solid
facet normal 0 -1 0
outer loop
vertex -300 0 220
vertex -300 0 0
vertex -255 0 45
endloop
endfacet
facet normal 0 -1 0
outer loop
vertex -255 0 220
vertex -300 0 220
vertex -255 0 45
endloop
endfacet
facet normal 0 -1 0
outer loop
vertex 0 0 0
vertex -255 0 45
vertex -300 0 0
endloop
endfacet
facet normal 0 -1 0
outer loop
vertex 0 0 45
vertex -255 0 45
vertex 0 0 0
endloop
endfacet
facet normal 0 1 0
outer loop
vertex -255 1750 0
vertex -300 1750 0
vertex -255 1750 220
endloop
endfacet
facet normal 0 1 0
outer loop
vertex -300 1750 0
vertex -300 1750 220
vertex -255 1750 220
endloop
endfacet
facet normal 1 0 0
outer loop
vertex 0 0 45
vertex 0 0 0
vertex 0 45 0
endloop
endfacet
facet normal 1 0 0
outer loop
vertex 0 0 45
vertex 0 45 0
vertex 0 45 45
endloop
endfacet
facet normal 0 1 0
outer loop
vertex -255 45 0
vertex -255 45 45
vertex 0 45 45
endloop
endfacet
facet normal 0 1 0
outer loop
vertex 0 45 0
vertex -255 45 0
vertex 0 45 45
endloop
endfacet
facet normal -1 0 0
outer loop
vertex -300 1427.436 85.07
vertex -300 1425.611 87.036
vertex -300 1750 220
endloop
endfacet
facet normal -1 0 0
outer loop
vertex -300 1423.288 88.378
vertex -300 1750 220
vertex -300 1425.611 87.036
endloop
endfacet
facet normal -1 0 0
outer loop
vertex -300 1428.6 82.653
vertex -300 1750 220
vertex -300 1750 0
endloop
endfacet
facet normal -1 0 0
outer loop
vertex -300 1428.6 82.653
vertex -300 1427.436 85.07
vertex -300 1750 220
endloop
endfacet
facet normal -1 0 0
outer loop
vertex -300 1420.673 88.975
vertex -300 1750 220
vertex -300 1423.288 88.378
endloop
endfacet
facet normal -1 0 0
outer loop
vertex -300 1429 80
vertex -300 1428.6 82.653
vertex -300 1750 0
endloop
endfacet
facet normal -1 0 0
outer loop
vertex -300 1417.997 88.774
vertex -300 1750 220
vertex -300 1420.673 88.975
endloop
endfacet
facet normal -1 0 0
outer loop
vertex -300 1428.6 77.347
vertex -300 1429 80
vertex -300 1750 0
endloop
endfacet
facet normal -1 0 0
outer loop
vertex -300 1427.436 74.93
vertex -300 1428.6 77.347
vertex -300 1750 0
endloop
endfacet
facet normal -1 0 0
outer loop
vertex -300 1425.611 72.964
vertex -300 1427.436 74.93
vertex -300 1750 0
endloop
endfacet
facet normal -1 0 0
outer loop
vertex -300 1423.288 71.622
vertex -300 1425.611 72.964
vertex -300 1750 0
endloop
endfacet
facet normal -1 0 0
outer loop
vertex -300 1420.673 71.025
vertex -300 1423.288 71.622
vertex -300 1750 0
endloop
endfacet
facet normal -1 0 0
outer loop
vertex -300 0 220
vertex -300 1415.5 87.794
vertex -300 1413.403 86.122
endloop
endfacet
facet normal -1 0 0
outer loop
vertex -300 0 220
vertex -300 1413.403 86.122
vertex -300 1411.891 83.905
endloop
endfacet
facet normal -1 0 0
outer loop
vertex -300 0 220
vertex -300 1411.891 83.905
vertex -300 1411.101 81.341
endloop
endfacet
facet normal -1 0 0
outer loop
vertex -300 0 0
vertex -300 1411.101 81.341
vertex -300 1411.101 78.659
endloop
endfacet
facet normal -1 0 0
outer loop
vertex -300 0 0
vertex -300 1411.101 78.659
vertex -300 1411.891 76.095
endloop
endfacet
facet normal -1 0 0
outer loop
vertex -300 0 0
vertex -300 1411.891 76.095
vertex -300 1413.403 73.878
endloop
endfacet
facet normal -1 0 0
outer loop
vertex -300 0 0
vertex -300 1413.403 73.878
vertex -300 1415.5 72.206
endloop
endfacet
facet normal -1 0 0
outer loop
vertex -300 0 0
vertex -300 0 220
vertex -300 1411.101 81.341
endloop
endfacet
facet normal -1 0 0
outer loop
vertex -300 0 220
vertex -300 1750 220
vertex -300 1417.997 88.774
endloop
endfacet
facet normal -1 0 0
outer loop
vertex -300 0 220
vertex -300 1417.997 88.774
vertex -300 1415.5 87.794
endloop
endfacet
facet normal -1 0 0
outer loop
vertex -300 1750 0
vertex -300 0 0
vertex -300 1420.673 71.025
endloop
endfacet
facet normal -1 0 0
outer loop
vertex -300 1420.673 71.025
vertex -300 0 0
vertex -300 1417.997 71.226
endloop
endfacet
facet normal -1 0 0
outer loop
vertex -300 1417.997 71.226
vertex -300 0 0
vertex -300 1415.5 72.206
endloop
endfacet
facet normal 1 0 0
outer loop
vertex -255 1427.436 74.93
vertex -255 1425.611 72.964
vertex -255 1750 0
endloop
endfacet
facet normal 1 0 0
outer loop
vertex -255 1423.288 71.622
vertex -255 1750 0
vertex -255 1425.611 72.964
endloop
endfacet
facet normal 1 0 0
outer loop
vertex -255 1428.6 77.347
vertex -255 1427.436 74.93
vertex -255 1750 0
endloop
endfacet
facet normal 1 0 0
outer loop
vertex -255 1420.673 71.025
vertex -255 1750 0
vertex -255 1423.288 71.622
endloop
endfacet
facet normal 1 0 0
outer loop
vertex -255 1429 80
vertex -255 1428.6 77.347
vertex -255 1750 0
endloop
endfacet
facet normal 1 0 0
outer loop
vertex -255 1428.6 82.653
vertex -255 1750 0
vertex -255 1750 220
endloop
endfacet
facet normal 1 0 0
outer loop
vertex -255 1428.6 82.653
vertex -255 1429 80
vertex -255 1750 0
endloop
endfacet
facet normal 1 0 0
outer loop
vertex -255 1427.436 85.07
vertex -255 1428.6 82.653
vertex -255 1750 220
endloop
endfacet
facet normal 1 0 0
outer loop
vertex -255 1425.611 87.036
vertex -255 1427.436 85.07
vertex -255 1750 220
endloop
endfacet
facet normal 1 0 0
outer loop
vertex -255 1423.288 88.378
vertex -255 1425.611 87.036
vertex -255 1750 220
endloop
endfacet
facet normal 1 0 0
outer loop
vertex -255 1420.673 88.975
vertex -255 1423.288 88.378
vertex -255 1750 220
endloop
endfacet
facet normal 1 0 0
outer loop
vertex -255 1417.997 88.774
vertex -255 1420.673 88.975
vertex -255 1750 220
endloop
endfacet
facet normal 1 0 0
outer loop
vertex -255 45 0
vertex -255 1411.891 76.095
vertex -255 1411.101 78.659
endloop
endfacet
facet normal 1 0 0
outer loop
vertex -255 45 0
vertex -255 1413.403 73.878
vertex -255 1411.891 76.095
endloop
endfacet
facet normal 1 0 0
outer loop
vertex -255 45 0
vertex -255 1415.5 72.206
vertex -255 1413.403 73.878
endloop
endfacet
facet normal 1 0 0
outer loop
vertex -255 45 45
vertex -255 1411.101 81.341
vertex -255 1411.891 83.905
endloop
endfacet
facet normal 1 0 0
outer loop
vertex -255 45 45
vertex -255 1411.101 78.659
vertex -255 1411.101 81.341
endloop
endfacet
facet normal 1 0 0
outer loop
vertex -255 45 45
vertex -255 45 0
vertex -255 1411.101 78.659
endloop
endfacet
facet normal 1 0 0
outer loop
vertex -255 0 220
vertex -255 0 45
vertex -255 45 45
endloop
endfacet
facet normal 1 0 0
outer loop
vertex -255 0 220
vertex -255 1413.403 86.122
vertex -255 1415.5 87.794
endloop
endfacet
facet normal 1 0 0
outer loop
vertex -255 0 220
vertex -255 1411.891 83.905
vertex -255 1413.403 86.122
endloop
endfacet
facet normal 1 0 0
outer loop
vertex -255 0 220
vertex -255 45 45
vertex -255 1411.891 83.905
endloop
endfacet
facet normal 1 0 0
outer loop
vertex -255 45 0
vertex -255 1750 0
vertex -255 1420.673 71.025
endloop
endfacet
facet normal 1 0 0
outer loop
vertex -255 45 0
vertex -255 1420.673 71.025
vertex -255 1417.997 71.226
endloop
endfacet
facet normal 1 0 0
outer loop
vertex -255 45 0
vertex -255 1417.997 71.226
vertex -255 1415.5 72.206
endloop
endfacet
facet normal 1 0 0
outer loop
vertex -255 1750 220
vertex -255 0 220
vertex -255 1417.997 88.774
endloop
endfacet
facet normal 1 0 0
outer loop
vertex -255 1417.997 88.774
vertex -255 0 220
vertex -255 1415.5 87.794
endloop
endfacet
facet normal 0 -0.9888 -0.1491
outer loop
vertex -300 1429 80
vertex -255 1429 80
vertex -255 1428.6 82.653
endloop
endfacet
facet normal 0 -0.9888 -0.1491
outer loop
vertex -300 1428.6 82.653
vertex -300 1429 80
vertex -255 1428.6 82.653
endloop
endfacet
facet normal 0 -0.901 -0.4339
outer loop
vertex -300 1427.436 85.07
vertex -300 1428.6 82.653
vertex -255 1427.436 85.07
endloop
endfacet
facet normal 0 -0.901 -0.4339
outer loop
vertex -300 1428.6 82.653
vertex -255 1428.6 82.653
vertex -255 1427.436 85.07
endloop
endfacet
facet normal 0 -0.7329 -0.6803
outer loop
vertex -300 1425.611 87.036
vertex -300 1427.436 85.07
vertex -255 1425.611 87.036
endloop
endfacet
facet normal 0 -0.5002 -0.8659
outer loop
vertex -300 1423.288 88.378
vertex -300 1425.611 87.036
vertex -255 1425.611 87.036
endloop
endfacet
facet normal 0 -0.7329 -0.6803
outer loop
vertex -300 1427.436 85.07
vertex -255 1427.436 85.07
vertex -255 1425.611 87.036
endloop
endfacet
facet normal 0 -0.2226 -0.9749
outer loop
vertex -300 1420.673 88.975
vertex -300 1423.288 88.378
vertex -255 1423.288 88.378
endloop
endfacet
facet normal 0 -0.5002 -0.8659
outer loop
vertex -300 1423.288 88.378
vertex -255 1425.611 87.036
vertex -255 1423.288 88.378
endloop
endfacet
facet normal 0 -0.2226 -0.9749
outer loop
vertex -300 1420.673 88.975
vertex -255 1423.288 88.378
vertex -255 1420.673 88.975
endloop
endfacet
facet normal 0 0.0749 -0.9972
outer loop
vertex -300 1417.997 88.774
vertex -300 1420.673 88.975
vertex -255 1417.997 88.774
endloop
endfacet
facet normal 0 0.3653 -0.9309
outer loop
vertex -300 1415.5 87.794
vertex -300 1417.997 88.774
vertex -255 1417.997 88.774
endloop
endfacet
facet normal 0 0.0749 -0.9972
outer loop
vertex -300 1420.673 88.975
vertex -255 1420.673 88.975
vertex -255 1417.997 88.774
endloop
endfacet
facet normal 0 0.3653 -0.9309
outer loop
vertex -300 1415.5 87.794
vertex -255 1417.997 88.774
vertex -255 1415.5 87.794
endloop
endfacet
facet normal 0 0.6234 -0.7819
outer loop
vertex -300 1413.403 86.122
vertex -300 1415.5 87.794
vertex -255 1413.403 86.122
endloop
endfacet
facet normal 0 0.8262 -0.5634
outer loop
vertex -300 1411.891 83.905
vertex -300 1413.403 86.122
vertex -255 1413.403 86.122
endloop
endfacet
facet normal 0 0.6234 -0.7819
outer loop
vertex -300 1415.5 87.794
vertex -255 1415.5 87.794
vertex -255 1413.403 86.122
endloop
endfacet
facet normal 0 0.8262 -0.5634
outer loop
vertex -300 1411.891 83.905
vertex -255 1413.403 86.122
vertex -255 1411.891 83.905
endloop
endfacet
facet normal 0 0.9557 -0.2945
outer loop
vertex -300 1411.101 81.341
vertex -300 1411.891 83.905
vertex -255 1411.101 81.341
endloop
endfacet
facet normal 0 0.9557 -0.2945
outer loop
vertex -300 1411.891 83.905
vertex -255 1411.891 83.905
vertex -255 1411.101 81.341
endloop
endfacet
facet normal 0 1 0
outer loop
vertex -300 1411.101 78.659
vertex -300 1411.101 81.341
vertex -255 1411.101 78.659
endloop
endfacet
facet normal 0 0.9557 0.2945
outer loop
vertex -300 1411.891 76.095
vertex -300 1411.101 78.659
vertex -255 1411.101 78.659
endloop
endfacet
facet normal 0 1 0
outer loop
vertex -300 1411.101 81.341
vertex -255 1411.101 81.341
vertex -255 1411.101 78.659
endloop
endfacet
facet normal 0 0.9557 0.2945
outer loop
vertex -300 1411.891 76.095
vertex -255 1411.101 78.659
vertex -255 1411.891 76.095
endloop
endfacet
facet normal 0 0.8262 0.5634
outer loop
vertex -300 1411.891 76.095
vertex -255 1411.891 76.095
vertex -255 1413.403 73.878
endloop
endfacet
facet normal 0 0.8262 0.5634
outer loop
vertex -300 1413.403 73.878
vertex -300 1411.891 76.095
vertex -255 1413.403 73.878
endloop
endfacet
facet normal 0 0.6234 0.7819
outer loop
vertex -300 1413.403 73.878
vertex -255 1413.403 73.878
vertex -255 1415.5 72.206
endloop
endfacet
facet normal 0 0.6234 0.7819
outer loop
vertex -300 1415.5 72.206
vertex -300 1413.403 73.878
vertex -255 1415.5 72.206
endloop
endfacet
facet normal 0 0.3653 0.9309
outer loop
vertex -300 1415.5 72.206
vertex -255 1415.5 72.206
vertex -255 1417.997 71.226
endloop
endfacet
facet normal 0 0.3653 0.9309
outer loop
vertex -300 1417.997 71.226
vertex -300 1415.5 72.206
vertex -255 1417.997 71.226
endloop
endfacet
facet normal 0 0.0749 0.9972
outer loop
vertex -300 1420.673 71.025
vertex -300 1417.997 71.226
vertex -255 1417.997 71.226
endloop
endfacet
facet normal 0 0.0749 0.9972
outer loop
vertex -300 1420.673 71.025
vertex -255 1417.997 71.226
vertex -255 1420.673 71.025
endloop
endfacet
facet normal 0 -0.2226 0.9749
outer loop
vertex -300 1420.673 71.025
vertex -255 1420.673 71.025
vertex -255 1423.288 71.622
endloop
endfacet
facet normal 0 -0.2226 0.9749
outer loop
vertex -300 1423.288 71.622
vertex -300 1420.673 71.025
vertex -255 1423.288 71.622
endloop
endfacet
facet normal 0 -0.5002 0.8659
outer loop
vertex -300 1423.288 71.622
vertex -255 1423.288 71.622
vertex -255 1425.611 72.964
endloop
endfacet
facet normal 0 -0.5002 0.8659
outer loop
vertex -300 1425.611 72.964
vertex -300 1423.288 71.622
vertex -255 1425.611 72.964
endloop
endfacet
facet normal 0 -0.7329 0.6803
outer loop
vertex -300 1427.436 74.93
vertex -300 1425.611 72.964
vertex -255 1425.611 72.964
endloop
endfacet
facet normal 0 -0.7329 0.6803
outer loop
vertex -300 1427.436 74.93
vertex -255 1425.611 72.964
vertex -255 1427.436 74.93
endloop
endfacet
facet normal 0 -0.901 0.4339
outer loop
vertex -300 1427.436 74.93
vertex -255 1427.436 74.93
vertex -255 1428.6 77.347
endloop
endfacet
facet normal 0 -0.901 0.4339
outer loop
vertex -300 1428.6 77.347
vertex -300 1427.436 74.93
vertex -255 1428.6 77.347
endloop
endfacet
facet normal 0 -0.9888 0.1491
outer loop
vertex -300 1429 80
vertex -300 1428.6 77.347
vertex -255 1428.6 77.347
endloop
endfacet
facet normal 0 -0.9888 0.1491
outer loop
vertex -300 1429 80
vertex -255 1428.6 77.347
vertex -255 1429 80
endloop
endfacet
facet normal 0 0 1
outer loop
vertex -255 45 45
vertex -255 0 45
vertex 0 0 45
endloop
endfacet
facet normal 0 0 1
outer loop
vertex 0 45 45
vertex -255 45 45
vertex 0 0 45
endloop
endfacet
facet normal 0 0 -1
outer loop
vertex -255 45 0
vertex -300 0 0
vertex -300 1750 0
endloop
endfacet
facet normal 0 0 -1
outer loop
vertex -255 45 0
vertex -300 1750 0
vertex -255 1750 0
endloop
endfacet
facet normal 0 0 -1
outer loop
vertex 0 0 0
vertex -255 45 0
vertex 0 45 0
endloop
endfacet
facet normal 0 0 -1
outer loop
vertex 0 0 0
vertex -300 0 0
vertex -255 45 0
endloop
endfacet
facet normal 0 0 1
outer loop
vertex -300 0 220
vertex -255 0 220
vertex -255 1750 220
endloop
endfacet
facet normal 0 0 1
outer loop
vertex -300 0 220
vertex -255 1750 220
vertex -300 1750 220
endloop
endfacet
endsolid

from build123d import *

# Parameters (mm, degrees)
F1_DEPTH = 1750
F0_W     = 255
F0_H     = 45
F2_DEPTH = 45
F3_R     = 9
F4_DEPTH = 300.001


with BuildPart() as f1:
    # F0 (on Front) → F1 (new body)
    with BuildSketch(Plane.XZ):
        Polygon((-300, 0), (-255, 0), (-255, 45), (-255, 220), (-300, 220), align=None)
    extrude(amount=-F1_DEPTH)

    # F0 (on Front) → F2 (join)
    with BuildSketch(Plane.XZ):
        with Locations((-127.5, 22.5)):
            Rectangle(F0_W, F0_H)
    extrude(amount=-F2_DEPTH)

    # F3 (on Right) → F4 (cut, through all)
    with BuildSketch(Plane.YZ):
        with Locations((1420, 80)):
            Circle(F3_R)
    extrude(amount=-F4_DEPTH, mode=Mode.SUBTRACT)


solid = f1.part
